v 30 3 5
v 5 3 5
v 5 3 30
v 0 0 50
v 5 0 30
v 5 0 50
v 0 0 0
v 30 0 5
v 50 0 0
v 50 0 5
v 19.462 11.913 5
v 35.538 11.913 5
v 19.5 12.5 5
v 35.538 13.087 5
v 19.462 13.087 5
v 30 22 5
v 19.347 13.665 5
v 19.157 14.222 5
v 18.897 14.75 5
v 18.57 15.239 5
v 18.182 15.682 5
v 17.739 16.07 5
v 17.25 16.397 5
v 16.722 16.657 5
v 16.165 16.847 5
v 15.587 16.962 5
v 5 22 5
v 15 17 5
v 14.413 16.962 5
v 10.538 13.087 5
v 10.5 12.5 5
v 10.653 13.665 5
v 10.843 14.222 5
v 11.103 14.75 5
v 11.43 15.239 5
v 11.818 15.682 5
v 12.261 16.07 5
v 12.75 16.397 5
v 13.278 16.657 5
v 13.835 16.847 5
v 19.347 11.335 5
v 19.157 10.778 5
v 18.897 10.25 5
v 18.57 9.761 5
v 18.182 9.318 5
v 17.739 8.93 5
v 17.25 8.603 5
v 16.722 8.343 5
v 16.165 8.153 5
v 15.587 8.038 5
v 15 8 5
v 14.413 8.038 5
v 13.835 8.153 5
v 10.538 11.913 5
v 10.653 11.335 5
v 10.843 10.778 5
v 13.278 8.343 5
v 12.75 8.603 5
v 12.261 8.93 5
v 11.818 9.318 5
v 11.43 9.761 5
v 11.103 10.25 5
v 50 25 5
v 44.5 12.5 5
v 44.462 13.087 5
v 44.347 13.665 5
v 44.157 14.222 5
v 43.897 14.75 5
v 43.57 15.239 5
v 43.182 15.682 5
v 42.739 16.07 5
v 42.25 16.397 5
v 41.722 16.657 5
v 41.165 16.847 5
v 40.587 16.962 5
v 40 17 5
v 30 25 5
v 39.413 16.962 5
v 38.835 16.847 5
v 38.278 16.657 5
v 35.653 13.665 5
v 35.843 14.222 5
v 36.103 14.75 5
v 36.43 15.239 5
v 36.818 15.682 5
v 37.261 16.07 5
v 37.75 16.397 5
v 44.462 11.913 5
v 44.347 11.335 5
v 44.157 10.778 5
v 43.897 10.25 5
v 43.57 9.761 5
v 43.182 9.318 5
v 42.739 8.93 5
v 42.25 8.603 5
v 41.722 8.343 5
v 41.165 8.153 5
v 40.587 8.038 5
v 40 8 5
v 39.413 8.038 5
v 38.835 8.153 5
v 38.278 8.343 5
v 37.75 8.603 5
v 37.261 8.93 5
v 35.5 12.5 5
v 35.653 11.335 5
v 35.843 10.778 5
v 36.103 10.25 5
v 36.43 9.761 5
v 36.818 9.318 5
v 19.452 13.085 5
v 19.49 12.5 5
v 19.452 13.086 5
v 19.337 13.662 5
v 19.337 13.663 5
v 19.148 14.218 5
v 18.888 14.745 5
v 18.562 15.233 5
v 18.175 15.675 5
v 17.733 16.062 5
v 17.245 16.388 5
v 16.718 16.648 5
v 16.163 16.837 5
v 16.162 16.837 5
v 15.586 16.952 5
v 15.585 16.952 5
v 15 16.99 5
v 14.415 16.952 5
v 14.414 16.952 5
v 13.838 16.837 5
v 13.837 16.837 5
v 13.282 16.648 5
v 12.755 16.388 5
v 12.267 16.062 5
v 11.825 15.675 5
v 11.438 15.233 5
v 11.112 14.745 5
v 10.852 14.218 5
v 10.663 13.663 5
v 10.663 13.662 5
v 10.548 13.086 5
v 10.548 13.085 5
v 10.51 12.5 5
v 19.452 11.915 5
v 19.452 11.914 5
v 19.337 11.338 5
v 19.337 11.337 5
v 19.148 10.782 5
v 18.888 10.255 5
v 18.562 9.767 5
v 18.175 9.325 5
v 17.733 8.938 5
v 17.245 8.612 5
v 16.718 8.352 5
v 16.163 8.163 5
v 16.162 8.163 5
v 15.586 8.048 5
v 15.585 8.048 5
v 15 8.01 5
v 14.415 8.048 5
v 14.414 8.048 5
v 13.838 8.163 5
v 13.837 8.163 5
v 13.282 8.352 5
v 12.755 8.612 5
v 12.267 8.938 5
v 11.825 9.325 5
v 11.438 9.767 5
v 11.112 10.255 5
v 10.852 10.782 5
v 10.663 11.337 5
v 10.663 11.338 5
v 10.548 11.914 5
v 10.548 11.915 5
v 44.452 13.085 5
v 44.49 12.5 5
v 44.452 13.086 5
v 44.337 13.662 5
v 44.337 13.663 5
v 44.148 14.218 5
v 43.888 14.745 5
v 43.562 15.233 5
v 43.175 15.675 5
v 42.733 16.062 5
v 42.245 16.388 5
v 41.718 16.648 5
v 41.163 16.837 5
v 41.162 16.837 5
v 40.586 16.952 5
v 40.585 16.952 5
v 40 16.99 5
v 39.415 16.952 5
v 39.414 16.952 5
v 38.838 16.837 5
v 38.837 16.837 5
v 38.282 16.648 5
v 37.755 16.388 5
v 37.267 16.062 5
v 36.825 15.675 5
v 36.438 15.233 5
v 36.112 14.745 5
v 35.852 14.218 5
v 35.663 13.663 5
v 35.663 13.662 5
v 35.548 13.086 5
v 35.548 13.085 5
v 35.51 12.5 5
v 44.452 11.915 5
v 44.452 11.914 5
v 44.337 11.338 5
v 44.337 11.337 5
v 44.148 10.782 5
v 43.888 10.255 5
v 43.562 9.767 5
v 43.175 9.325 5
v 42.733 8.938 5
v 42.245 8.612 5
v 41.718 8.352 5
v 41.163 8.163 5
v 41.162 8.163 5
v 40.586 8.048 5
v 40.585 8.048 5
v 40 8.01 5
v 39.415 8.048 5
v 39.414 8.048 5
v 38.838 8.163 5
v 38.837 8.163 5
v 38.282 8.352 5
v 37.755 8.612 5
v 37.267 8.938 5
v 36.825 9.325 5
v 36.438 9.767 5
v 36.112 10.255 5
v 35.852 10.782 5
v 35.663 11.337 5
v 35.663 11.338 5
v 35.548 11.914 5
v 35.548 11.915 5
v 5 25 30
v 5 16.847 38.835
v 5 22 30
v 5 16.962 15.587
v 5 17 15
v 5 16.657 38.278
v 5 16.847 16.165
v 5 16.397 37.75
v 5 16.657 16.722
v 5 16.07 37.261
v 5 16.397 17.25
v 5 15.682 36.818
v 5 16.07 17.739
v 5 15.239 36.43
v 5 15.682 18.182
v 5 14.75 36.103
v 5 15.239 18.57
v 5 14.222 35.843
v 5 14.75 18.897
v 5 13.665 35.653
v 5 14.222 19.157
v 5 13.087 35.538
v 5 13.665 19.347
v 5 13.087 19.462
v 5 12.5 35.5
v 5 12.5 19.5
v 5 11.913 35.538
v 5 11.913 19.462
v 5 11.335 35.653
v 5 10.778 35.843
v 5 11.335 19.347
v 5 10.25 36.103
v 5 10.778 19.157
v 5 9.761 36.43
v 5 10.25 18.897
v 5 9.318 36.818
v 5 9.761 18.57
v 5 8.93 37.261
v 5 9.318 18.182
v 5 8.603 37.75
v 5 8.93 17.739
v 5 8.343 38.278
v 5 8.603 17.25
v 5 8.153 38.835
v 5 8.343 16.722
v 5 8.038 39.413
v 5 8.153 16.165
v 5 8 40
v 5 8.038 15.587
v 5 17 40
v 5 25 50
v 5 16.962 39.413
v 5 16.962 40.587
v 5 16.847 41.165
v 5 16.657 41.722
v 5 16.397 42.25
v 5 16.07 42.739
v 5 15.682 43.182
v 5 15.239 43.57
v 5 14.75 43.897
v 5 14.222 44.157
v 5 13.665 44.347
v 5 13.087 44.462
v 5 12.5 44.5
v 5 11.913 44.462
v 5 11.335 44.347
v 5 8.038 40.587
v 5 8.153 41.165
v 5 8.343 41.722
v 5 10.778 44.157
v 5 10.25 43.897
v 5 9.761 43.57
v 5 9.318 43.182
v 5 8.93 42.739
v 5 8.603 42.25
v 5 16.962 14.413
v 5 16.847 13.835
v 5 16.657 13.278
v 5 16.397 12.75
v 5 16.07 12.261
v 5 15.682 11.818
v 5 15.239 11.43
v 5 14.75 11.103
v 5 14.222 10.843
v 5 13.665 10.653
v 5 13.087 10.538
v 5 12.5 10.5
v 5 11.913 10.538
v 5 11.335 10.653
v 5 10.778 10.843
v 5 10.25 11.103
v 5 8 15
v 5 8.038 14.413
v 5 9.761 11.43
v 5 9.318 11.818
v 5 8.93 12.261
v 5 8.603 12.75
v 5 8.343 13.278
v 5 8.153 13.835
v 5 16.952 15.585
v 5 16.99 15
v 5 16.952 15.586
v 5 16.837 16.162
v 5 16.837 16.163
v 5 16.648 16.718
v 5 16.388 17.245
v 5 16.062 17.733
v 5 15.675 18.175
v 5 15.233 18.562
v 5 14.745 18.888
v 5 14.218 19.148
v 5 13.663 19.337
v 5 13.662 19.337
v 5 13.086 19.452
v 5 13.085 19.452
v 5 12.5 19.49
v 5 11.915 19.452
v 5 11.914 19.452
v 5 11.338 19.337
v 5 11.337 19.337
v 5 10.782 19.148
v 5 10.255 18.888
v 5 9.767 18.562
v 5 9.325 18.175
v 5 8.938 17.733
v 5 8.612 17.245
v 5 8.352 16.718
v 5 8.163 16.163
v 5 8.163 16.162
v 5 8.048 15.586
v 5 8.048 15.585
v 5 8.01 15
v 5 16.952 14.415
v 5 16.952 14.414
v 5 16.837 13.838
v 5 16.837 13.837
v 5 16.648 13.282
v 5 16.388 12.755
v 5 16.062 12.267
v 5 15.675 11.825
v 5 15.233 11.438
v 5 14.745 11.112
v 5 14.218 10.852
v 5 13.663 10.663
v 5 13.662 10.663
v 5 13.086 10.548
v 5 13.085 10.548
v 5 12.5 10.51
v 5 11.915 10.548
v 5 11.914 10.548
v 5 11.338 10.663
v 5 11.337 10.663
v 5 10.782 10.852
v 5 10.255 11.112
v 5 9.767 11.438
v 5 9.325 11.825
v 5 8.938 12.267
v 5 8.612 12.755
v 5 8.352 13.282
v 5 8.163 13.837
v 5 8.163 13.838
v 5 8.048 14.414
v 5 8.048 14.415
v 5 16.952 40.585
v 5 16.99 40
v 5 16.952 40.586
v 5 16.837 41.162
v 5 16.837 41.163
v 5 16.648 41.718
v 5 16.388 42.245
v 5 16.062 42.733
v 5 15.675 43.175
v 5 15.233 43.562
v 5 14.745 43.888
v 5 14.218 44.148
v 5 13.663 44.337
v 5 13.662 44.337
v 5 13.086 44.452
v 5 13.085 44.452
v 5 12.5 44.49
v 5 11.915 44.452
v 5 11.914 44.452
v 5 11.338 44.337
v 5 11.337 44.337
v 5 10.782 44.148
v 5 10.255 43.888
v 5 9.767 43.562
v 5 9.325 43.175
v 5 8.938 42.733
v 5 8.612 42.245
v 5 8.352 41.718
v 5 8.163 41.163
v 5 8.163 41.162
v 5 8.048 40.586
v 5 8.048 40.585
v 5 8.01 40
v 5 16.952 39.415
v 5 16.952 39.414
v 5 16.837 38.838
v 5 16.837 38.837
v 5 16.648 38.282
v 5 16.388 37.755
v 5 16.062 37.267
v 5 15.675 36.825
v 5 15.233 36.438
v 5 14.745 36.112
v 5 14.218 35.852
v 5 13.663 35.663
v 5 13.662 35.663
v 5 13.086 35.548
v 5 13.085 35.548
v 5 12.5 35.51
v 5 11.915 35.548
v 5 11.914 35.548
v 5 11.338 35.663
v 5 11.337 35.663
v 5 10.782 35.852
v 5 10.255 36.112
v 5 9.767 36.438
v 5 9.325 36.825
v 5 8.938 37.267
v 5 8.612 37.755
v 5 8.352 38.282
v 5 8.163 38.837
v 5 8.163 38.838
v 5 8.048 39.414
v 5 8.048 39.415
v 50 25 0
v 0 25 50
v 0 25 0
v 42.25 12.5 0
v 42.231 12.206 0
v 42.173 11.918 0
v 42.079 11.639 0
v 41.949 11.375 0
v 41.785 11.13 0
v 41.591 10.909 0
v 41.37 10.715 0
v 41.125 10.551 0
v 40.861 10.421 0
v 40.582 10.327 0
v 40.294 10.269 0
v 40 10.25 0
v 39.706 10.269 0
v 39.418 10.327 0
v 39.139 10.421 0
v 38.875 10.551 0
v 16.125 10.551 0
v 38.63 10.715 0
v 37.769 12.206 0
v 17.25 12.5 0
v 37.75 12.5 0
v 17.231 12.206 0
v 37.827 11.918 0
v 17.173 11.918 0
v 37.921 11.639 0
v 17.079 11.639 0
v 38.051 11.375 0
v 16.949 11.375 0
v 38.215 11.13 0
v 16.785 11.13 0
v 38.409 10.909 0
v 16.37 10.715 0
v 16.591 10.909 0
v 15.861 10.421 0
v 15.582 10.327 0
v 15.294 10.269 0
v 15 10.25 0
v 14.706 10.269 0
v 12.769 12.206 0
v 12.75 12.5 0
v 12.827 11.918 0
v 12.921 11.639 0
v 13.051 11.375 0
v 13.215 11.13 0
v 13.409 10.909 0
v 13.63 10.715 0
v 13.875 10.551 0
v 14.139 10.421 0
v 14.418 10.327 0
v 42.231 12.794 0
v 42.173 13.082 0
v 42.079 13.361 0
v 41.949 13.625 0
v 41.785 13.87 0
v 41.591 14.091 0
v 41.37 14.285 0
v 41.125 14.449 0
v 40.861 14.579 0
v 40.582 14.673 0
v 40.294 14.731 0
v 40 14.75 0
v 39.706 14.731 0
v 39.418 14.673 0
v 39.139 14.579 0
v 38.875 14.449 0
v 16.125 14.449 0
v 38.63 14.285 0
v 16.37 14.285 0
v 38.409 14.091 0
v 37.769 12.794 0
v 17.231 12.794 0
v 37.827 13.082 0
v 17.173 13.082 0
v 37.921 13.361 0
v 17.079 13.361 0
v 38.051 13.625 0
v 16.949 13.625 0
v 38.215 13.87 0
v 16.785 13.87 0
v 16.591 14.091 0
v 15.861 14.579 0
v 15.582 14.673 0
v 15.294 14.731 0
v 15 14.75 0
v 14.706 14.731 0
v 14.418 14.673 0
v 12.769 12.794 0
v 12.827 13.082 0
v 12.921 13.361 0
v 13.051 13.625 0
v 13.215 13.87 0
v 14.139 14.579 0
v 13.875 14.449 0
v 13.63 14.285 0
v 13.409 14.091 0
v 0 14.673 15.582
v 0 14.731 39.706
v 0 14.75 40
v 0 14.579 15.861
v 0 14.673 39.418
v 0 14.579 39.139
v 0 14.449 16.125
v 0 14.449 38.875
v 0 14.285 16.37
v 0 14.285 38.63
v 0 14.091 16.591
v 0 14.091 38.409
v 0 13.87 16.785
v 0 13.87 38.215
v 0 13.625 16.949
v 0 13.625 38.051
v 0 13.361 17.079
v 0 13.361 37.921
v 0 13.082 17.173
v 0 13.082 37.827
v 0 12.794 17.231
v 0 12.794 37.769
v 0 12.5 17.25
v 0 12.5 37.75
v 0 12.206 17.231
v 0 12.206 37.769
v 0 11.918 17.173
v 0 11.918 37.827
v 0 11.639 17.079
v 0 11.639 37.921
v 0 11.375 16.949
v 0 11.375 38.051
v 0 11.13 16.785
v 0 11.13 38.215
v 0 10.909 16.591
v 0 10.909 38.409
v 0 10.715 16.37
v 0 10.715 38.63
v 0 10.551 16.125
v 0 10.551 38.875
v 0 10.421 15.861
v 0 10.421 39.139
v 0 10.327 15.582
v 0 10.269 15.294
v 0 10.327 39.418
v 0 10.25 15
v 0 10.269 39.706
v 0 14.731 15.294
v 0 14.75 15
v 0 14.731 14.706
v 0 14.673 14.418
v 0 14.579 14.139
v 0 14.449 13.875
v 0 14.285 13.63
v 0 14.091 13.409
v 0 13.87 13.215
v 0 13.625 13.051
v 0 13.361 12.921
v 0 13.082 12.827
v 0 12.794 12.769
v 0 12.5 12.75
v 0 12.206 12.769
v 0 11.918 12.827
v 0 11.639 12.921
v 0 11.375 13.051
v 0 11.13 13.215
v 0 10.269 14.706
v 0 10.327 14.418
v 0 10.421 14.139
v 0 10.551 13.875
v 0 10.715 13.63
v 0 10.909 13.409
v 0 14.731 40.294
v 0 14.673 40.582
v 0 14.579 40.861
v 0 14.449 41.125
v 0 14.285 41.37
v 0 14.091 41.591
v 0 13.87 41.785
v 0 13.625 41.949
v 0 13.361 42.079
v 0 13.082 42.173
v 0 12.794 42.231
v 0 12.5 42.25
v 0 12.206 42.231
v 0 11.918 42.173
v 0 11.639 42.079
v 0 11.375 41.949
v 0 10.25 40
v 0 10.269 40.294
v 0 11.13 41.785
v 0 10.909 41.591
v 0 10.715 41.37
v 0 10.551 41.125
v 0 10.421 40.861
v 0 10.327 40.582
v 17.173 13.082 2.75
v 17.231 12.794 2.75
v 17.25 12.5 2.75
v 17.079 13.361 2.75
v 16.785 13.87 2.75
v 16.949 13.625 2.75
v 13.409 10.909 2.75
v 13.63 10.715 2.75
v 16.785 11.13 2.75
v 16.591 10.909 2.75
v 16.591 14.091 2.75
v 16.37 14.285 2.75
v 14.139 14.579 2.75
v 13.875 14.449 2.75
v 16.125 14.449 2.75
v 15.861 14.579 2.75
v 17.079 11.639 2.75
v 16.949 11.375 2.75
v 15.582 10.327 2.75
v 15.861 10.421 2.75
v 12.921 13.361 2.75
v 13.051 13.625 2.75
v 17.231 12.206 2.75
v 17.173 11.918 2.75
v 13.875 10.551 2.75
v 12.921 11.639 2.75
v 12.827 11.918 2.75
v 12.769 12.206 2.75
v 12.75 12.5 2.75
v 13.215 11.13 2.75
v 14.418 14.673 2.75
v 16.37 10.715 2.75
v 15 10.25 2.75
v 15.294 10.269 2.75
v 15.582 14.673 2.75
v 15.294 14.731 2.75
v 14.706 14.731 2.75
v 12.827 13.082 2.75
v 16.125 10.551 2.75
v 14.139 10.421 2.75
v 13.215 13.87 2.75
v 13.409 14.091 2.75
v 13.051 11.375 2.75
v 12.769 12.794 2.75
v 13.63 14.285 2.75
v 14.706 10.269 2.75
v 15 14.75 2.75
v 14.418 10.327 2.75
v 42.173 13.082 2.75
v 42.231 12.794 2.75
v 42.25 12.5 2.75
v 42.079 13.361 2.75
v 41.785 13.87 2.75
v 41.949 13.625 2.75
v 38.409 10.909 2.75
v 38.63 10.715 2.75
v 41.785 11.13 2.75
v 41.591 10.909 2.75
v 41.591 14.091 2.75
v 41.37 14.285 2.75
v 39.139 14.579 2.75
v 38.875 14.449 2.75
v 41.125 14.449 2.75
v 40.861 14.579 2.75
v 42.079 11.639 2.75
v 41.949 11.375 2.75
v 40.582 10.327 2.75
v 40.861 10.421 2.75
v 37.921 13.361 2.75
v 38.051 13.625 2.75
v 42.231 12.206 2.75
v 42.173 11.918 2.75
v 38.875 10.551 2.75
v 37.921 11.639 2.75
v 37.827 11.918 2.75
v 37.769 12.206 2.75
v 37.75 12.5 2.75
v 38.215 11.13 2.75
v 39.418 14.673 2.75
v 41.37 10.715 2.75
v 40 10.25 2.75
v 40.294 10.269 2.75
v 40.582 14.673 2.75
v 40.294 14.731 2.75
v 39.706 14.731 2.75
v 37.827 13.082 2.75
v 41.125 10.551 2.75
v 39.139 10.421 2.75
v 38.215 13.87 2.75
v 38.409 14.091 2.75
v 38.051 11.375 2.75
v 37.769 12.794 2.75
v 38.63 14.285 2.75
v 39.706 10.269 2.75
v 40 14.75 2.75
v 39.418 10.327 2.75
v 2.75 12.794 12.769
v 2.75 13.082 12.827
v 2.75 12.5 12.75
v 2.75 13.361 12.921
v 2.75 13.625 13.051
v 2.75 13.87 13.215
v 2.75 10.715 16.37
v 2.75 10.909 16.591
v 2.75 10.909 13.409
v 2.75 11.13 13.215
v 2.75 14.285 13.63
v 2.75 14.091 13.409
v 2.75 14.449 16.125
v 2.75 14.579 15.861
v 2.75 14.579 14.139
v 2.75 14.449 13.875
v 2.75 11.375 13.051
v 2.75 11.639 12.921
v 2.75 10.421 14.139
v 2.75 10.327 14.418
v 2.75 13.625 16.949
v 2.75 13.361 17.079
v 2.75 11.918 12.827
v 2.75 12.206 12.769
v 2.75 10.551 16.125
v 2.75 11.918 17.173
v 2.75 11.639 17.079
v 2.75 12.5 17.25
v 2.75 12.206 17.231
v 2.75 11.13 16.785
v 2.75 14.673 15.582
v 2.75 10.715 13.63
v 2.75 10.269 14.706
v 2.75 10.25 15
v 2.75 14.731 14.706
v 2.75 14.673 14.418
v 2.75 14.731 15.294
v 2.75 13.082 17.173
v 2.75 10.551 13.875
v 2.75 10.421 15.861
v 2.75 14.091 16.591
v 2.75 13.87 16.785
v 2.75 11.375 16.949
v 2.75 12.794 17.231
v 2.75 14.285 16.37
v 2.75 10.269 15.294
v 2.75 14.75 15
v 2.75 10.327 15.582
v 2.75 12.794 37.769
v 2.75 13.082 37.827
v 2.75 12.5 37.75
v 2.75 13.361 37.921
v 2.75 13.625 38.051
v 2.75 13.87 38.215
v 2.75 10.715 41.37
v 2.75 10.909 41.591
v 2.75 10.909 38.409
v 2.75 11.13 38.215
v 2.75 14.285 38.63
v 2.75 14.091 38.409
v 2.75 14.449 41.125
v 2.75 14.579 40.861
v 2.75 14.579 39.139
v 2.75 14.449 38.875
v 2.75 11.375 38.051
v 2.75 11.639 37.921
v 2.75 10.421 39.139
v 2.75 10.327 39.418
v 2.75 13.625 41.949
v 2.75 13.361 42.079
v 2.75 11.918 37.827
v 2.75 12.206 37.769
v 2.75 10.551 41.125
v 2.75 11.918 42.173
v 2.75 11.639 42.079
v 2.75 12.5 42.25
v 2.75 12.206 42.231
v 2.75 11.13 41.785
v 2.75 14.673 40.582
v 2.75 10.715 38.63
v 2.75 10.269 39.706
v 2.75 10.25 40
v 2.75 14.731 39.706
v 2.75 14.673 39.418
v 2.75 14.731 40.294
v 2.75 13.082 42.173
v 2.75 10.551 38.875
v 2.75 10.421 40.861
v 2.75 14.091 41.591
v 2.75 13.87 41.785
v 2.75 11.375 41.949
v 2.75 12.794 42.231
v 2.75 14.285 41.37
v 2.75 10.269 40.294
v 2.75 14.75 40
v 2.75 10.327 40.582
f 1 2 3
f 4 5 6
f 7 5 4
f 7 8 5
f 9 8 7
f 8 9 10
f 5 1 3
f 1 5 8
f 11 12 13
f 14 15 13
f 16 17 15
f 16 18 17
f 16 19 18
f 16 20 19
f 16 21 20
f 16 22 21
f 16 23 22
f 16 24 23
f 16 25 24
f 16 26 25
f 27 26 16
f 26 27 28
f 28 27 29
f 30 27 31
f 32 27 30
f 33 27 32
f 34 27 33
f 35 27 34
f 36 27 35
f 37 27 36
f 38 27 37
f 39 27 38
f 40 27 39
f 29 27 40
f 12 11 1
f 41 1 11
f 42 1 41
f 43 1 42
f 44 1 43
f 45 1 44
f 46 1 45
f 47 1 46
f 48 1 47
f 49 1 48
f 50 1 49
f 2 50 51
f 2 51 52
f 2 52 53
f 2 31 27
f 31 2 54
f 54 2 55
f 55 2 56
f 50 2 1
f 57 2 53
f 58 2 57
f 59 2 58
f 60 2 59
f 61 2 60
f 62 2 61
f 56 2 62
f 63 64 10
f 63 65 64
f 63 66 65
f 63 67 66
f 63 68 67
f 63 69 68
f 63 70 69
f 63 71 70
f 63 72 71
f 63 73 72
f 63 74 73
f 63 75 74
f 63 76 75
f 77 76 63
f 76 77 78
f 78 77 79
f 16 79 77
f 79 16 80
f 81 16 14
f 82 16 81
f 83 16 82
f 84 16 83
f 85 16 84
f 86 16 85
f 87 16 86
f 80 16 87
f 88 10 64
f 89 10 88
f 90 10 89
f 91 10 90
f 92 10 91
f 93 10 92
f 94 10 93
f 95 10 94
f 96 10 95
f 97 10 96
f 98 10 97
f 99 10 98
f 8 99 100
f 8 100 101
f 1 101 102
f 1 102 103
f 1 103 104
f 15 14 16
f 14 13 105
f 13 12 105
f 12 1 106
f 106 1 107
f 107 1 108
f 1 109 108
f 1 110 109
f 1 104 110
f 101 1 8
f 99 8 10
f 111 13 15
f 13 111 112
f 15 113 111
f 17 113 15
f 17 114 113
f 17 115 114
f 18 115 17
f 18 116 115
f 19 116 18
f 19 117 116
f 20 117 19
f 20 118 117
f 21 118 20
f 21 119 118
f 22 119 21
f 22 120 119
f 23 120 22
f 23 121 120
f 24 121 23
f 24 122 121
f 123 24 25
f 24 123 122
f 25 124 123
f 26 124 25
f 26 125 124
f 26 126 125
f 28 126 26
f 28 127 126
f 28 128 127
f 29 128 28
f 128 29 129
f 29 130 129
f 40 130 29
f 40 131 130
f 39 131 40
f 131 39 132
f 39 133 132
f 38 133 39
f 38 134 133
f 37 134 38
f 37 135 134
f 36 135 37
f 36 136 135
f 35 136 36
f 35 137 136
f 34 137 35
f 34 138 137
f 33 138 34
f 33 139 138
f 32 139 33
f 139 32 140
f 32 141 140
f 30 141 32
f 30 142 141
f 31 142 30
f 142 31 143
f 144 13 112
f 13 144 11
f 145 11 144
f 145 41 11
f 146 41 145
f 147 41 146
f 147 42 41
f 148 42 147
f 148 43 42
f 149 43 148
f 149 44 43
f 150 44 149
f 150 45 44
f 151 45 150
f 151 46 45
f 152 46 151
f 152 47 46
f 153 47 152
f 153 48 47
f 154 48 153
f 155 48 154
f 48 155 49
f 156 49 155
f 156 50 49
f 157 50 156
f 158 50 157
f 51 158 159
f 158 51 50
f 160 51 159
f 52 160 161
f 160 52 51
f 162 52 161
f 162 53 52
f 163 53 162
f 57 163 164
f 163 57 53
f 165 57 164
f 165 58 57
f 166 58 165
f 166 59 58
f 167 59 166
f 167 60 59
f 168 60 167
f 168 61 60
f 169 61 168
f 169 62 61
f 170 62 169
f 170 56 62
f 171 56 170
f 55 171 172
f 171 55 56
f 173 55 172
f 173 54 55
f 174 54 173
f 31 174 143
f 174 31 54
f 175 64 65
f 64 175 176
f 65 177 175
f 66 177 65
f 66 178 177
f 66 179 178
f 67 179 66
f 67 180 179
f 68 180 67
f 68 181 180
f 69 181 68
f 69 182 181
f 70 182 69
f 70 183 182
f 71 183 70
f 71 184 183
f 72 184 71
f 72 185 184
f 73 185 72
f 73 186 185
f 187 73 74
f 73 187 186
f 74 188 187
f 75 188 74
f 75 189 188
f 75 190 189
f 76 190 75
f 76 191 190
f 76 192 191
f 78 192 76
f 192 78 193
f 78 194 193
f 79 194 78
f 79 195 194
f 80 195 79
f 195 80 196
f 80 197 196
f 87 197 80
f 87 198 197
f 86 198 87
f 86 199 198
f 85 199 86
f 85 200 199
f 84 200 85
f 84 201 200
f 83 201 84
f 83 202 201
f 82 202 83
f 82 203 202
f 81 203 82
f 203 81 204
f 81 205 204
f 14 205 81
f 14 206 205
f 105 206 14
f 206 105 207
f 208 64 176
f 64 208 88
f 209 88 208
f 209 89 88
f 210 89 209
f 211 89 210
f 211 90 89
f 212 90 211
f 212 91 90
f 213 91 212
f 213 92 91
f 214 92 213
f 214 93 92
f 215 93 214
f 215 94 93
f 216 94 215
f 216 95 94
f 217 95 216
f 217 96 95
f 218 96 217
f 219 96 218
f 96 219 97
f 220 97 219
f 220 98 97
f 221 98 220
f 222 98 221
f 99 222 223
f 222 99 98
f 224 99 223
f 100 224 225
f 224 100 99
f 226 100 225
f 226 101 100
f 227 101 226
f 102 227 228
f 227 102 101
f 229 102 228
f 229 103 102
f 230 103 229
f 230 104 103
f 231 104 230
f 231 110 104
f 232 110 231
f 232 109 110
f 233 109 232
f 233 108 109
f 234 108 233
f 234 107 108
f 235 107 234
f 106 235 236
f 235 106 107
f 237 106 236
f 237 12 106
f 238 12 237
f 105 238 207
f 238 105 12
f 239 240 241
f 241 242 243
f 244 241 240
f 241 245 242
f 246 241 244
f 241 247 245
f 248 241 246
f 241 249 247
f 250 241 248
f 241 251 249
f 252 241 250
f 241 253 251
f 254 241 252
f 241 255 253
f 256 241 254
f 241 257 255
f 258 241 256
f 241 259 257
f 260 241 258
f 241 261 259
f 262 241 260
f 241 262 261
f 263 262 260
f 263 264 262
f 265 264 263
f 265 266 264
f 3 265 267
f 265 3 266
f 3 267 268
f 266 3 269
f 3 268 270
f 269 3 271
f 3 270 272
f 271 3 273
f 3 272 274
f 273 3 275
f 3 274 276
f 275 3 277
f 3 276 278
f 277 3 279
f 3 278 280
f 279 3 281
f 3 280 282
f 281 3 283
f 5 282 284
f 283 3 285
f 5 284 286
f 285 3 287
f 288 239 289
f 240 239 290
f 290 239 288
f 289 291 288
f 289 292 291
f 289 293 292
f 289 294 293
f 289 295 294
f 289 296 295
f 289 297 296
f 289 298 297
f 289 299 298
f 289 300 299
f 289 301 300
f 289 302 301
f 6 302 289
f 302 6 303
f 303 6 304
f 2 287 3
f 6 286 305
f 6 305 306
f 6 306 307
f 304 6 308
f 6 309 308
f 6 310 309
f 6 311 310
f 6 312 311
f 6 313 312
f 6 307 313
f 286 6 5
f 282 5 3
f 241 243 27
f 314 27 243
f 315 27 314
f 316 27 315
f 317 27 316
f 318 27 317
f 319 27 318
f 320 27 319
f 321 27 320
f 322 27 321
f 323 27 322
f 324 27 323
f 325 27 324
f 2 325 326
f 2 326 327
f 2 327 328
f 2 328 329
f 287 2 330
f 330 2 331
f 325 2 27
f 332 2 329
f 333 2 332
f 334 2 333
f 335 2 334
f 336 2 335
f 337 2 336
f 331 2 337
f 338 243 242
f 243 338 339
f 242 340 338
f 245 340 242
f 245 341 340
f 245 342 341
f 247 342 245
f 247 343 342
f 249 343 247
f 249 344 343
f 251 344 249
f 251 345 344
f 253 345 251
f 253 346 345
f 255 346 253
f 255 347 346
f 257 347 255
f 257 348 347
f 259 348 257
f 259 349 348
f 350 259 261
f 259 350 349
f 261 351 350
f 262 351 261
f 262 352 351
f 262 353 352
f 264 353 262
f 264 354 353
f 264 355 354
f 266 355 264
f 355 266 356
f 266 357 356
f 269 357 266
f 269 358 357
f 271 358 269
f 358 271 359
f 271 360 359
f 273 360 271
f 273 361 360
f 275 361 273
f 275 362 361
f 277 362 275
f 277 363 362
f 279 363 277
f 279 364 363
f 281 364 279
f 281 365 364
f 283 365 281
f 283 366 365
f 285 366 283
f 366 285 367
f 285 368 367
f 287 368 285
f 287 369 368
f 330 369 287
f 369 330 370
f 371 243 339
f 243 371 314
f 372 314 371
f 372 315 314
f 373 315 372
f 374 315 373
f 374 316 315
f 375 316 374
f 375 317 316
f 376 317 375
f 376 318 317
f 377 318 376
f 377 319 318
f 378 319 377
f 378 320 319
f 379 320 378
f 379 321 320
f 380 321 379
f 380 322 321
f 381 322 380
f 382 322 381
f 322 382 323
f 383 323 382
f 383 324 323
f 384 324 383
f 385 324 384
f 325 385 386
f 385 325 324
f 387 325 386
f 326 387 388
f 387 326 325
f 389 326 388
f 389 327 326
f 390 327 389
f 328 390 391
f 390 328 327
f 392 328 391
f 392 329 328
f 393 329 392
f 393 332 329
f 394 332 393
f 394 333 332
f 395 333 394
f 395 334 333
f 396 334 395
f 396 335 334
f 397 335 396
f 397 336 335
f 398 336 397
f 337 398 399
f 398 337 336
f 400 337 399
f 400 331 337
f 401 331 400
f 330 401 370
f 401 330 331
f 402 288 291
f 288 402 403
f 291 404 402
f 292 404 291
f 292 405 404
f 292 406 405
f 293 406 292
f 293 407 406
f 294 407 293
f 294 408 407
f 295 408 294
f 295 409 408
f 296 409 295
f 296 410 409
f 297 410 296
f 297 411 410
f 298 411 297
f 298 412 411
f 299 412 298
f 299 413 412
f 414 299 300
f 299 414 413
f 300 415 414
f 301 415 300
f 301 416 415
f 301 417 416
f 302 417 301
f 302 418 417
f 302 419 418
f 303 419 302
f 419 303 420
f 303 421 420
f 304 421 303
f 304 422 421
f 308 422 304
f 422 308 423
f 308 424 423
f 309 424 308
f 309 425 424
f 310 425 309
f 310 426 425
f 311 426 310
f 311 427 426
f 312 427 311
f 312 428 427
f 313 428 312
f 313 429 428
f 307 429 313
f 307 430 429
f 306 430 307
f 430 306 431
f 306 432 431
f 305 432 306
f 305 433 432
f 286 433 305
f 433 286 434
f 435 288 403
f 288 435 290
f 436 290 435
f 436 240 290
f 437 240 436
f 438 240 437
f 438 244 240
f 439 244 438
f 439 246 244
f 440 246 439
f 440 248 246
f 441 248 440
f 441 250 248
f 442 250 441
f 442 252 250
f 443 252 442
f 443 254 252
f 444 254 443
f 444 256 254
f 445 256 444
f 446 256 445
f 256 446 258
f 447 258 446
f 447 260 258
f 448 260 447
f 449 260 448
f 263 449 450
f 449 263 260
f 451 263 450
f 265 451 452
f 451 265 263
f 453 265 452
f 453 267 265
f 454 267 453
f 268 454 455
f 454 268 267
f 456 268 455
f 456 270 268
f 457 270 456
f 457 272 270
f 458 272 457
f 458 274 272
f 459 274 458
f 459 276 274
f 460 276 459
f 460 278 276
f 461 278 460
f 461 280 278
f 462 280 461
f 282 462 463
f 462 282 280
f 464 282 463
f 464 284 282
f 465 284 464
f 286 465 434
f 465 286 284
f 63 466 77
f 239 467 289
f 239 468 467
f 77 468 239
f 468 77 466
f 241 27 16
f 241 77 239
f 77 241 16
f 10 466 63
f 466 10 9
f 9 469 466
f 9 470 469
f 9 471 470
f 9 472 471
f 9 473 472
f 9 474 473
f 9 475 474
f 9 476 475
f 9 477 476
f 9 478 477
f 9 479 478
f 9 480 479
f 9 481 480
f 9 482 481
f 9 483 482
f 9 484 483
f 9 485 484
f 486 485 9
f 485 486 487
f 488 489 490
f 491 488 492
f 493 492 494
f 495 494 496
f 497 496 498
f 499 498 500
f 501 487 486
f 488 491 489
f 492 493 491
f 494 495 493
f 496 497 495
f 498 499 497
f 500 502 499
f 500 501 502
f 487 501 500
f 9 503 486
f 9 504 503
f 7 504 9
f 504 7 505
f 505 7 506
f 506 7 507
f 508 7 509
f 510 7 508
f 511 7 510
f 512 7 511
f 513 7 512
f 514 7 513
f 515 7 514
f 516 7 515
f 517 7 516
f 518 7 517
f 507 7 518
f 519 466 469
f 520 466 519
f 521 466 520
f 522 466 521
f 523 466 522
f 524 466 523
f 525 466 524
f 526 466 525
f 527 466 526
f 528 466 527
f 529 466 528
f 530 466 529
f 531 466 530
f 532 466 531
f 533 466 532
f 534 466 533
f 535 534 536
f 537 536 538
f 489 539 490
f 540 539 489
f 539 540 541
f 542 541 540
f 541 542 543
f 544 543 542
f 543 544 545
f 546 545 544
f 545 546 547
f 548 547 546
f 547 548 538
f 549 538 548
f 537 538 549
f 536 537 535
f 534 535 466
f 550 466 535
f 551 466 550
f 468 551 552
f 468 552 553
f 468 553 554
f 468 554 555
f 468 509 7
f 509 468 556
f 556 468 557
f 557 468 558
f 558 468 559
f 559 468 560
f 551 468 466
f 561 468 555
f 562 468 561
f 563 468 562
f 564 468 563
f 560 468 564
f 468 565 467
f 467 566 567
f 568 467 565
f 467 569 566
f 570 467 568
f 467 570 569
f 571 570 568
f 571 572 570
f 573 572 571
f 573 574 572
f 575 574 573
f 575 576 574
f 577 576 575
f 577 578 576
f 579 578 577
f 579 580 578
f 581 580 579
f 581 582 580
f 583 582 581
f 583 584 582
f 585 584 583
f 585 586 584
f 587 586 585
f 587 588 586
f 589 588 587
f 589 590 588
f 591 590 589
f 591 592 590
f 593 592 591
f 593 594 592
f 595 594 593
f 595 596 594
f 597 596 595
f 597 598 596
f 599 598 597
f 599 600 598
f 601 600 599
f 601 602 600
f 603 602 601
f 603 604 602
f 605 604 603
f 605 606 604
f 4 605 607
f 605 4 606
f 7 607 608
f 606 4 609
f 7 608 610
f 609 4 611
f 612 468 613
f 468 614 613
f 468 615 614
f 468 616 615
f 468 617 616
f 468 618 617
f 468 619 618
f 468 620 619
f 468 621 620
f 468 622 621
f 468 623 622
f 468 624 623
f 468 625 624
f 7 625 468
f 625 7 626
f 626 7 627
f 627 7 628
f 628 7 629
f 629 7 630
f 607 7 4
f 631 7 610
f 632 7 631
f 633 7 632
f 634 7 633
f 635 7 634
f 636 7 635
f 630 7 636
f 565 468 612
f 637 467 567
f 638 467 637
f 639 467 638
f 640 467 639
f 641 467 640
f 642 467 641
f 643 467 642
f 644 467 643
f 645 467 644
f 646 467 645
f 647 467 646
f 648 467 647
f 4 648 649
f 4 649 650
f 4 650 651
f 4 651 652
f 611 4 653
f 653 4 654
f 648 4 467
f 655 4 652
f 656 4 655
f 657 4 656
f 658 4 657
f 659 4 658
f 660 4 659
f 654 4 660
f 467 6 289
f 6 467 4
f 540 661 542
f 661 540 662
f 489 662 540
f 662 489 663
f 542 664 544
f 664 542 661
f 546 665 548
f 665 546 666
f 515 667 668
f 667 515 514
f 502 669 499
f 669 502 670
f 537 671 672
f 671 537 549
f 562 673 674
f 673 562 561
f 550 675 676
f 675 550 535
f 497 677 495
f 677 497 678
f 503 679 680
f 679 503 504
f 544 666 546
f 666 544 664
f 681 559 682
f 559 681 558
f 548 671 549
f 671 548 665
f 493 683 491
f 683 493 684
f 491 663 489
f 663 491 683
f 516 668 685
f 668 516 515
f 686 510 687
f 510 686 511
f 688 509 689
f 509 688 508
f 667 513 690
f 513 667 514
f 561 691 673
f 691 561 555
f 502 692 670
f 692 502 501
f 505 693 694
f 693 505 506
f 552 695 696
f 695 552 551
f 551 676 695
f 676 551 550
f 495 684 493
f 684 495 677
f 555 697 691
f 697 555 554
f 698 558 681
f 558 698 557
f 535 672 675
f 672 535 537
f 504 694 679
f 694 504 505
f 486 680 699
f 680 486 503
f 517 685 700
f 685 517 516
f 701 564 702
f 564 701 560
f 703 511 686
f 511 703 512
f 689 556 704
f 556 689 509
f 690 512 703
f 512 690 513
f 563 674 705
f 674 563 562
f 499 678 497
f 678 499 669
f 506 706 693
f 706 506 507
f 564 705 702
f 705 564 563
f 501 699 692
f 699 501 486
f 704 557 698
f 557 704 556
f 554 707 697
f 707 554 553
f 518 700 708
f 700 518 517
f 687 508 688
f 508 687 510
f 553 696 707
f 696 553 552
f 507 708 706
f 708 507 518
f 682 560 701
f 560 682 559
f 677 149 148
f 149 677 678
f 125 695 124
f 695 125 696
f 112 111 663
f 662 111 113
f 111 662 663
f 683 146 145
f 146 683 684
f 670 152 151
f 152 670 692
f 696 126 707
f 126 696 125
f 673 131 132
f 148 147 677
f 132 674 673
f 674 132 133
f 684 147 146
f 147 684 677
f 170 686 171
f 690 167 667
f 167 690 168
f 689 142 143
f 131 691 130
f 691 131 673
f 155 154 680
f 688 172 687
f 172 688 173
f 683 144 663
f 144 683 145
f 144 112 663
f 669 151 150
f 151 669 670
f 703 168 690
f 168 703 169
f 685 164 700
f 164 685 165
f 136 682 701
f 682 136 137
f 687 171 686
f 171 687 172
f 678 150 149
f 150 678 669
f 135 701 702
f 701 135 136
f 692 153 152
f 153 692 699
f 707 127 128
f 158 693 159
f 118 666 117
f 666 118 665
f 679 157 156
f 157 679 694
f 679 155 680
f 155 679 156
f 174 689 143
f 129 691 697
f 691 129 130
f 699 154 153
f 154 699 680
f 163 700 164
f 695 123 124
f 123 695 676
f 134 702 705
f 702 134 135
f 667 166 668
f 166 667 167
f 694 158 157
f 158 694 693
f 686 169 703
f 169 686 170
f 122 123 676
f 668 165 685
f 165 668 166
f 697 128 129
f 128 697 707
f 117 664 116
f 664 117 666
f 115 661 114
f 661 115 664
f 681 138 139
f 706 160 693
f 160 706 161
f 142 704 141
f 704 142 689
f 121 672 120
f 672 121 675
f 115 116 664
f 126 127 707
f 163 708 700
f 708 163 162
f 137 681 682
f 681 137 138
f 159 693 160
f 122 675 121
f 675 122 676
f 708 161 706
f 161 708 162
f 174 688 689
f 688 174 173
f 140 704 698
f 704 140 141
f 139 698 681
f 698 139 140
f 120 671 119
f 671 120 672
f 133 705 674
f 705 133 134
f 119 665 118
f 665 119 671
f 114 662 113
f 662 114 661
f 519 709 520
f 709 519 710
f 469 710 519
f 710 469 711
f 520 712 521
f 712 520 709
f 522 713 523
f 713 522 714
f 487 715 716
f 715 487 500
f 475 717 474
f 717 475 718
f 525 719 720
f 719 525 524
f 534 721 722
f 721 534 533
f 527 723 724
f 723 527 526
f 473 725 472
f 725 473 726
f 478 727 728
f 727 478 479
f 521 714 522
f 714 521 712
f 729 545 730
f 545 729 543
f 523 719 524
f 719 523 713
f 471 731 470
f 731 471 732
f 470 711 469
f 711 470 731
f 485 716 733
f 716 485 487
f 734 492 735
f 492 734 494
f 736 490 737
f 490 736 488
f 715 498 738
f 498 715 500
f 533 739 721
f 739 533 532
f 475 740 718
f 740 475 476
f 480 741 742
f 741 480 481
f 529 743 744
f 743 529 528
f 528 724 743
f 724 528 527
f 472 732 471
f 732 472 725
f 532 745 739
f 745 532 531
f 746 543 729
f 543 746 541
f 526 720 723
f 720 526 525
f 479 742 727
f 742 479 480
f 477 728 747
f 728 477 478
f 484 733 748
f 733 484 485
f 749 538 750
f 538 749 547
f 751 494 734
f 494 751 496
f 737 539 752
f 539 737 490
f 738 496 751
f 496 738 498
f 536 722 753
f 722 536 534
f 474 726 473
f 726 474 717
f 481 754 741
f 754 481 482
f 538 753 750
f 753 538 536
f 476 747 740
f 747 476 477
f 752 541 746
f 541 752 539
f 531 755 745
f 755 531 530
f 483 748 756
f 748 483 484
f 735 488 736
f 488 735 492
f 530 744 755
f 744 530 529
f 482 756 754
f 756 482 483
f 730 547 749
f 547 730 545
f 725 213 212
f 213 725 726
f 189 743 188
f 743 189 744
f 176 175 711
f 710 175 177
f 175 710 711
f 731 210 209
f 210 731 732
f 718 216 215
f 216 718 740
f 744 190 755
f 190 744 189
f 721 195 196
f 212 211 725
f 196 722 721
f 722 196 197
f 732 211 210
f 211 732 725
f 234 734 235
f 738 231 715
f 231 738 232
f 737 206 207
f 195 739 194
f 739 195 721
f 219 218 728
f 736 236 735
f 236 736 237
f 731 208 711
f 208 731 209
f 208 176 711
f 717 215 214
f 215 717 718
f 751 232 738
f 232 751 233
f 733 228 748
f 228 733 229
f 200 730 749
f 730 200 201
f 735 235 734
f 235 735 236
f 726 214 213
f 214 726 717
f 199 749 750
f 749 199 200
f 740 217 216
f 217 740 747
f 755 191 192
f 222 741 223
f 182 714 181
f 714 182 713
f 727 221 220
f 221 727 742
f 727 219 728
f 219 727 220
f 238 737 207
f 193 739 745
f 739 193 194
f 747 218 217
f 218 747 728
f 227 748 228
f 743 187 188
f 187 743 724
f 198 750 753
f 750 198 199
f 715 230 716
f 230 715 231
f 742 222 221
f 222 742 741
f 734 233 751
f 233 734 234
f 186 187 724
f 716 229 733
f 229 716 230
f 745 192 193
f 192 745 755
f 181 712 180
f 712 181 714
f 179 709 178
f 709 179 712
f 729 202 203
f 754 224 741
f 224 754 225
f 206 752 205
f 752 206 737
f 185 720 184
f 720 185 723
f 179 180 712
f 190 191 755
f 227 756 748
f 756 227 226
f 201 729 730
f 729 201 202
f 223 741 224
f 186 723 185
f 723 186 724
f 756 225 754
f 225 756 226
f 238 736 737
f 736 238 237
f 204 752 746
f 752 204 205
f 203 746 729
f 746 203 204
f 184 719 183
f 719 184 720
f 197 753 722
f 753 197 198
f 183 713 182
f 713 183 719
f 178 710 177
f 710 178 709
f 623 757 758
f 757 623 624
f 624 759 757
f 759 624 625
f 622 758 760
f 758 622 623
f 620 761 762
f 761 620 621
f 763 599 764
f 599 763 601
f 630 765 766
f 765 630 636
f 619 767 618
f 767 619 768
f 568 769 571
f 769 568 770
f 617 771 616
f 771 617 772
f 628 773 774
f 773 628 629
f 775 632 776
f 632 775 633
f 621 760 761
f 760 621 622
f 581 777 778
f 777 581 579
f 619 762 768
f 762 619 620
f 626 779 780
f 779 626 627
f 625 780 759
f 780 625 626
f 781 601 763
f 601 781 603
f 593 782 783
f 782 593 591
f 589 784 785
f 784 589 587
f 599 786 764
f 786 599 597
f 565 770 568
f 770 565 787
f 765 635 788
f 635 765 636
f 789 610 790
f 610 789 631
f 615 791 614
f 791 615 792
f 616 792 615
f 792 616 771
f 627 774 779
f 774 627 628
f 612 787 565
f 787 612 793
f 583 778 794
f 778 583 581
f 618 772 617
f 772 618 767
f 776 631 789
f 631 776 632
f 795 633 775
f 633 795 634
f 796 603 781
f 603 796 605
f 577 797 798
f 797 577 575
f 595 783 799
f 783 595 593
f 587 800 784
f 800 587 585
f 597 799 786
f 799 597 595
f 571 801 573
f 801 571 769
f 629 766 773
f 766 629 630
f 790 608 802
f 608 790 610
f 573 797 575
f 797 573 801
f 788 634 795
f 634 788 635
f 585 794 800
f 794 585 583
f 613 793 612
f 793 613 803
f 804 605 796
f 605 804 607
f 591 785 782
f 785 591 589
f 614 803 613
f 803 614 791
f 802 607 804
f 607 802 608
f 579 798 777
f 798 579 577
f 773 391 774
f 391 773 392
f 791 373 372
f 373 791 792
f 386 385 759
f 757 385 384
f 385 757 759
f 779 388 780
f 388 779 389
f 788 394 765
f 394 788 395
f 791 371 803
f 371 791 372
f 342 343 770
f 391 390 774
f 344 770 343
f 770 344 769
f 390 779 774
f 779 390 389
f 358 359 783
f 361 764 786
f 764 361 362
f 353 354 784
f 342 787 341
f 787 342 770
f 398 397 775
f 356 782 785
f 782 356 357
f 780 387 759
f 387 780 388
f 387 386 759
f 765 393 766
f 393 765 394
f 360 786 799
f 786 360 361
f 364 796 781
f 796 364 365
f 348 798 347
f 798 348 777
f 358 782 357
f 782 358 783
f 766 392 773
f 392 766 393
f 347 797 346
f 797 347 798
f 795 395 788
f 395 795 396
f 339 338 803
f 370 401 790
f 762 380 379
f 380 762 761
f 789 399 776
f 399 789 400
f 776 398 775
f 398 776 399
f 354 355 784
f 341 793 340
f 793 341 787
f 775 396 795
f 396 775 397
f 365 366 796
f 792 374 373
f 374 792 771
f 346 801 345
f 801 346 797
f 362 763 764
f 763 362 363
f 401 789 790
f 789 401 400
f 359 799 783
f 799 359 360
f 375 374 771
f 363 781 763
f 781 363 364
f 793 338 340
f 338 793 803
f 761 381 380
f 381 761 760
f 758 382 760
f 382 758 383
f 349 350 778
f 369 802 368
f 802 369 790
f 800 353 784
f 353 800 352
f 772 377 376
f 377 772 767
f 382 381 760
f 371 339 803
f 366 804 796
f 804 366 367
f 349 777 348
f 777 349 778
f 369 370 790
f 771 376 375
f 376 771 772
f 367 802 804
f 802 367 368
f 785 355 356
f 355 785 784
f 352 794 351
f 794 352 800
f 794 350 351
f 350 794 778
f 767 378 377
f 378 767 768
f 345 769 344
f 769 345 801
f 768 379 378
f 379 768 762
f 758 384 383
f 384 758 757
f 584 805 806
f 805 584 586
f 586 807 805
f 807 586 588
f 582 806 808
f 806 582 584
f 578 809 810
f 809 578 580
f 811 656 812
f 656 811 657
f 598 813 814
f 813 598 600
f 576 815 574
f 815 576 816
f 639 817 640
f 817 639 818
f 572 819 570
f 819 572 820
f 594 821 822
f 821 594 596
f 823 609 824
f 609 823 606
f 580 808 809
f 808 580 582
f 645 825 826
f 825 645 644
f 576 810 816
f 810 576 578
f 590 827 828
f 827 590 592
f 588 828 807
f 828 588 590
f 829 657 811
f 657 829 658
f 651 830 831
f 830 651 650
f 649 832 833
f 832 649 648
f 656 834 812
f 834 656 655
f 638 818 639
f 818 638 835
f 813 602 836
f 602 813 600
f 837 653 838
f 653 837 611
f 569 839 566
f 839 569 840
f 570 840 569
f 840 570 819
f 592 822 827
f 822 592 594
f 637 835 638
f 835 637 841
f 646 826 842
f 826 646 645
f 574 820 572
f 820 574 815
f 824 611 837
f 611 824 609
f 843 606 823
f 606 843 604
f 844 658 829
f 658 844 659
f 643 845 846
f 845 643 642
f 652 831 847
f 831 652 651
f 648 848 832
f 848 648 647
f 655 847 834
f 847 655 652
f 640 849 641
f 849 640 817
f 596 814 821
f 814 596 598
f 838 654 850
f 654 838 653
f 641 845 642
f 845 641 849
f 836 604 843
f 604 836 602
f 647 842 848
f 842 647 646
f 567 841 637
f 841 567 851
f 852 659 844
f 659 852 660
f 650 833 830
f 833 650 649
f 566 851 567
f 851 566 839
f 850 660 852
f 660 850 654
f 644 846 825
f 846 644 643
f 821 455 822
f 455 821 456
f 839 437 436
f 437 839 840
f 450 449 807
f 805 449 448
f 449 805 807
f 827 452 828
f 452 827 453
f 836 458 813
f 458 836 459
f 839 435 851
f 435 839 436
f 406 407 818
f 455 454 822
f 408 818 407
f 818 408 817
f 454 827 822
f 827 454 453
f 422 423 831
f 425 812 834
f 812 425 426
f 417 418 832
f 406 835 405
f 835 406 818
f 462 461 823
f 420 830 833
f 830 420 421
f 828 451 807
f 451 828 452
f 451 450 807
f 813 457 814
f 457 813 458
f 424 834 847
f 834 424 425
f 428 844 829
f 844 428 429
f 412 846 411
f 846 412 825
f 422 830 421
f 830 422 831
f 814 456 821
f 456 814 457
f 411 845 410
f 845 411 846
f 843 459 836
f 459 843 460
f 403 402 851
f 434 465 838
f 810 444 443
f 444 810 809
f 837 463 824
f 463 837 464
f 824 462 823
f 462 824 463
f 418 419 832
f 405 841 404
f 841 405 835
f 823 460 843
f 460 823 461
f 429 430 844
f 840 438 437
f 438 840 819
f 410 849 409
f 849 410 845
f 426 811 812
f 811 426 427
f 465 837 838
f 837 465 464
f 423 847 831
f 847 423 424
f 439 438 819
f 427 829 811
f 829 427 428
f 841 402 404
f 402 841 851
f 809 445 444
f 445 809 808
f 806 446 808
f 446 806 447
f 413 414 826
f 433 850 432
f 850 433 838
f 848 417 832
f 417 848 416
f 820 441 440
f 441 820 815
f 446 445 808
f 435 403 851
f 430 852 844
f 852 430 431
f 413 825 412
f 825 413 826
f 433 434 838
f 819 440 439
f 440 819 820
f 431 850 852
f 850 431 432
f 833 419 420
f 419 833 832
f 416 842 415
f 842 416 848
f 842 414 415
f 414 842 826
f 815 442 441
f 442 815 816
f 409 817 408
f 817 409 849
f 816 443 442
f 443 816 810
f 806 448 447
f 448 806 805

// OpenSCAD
// L bracket for a shelf: legs 50 mm on the outside, 25 mm wide, 5 mm thick,
// a triangular gusset on each side, two 4.5 mm holes per leg 15 and 40 mm from the
// outside corner, countersunk for #8 flat-head screws on the inside faces.
// Printed with one leg flat on the bed.
leg = 50;
w = 25;
t = 5;
hole_d = 4.5;
head_d = 9;             // #8 flat head is about 8.4 mm
hole_at = [15, 40];
gusset = 30;
gusset_t = 3;
$fn = 48;

module countersunk_hole(len) {
    // axis along +Z, head at z = len
    translate([0, 0, -1]) cylinder(d = hole_d, h = len + 2);
    translate([0, 0, len - (head_d - hole_d) / 2]) cylinder(d1 = hole_d, d2 = head_d, h = (head_d - hole_d) / 2 + 0.01);
    translate([0, 0, len]) cylinder(d = head_d, h = 1);
}

difference() {
    union() {
        cube([leg, w, t]);                  // leg on the bed
        cube([t, w, leg]);                  // upright leg
        for (y = [0, w - gusset_t])
            translate([0, y + gusset_t, 0]) rotate([90, 0, 0])
                linear_extrude(gusset_t) polygon([[t, t], [gusset, t], [t, gusset]]);
    }
    for (x = hole_at) translate([x, w / 2, 0]) countersunk_hole(t);
    for (zz = hole_at) translate([0, w / 2, zz]) rotate([0, 90, 0]) countersunk_hole(t);
}
